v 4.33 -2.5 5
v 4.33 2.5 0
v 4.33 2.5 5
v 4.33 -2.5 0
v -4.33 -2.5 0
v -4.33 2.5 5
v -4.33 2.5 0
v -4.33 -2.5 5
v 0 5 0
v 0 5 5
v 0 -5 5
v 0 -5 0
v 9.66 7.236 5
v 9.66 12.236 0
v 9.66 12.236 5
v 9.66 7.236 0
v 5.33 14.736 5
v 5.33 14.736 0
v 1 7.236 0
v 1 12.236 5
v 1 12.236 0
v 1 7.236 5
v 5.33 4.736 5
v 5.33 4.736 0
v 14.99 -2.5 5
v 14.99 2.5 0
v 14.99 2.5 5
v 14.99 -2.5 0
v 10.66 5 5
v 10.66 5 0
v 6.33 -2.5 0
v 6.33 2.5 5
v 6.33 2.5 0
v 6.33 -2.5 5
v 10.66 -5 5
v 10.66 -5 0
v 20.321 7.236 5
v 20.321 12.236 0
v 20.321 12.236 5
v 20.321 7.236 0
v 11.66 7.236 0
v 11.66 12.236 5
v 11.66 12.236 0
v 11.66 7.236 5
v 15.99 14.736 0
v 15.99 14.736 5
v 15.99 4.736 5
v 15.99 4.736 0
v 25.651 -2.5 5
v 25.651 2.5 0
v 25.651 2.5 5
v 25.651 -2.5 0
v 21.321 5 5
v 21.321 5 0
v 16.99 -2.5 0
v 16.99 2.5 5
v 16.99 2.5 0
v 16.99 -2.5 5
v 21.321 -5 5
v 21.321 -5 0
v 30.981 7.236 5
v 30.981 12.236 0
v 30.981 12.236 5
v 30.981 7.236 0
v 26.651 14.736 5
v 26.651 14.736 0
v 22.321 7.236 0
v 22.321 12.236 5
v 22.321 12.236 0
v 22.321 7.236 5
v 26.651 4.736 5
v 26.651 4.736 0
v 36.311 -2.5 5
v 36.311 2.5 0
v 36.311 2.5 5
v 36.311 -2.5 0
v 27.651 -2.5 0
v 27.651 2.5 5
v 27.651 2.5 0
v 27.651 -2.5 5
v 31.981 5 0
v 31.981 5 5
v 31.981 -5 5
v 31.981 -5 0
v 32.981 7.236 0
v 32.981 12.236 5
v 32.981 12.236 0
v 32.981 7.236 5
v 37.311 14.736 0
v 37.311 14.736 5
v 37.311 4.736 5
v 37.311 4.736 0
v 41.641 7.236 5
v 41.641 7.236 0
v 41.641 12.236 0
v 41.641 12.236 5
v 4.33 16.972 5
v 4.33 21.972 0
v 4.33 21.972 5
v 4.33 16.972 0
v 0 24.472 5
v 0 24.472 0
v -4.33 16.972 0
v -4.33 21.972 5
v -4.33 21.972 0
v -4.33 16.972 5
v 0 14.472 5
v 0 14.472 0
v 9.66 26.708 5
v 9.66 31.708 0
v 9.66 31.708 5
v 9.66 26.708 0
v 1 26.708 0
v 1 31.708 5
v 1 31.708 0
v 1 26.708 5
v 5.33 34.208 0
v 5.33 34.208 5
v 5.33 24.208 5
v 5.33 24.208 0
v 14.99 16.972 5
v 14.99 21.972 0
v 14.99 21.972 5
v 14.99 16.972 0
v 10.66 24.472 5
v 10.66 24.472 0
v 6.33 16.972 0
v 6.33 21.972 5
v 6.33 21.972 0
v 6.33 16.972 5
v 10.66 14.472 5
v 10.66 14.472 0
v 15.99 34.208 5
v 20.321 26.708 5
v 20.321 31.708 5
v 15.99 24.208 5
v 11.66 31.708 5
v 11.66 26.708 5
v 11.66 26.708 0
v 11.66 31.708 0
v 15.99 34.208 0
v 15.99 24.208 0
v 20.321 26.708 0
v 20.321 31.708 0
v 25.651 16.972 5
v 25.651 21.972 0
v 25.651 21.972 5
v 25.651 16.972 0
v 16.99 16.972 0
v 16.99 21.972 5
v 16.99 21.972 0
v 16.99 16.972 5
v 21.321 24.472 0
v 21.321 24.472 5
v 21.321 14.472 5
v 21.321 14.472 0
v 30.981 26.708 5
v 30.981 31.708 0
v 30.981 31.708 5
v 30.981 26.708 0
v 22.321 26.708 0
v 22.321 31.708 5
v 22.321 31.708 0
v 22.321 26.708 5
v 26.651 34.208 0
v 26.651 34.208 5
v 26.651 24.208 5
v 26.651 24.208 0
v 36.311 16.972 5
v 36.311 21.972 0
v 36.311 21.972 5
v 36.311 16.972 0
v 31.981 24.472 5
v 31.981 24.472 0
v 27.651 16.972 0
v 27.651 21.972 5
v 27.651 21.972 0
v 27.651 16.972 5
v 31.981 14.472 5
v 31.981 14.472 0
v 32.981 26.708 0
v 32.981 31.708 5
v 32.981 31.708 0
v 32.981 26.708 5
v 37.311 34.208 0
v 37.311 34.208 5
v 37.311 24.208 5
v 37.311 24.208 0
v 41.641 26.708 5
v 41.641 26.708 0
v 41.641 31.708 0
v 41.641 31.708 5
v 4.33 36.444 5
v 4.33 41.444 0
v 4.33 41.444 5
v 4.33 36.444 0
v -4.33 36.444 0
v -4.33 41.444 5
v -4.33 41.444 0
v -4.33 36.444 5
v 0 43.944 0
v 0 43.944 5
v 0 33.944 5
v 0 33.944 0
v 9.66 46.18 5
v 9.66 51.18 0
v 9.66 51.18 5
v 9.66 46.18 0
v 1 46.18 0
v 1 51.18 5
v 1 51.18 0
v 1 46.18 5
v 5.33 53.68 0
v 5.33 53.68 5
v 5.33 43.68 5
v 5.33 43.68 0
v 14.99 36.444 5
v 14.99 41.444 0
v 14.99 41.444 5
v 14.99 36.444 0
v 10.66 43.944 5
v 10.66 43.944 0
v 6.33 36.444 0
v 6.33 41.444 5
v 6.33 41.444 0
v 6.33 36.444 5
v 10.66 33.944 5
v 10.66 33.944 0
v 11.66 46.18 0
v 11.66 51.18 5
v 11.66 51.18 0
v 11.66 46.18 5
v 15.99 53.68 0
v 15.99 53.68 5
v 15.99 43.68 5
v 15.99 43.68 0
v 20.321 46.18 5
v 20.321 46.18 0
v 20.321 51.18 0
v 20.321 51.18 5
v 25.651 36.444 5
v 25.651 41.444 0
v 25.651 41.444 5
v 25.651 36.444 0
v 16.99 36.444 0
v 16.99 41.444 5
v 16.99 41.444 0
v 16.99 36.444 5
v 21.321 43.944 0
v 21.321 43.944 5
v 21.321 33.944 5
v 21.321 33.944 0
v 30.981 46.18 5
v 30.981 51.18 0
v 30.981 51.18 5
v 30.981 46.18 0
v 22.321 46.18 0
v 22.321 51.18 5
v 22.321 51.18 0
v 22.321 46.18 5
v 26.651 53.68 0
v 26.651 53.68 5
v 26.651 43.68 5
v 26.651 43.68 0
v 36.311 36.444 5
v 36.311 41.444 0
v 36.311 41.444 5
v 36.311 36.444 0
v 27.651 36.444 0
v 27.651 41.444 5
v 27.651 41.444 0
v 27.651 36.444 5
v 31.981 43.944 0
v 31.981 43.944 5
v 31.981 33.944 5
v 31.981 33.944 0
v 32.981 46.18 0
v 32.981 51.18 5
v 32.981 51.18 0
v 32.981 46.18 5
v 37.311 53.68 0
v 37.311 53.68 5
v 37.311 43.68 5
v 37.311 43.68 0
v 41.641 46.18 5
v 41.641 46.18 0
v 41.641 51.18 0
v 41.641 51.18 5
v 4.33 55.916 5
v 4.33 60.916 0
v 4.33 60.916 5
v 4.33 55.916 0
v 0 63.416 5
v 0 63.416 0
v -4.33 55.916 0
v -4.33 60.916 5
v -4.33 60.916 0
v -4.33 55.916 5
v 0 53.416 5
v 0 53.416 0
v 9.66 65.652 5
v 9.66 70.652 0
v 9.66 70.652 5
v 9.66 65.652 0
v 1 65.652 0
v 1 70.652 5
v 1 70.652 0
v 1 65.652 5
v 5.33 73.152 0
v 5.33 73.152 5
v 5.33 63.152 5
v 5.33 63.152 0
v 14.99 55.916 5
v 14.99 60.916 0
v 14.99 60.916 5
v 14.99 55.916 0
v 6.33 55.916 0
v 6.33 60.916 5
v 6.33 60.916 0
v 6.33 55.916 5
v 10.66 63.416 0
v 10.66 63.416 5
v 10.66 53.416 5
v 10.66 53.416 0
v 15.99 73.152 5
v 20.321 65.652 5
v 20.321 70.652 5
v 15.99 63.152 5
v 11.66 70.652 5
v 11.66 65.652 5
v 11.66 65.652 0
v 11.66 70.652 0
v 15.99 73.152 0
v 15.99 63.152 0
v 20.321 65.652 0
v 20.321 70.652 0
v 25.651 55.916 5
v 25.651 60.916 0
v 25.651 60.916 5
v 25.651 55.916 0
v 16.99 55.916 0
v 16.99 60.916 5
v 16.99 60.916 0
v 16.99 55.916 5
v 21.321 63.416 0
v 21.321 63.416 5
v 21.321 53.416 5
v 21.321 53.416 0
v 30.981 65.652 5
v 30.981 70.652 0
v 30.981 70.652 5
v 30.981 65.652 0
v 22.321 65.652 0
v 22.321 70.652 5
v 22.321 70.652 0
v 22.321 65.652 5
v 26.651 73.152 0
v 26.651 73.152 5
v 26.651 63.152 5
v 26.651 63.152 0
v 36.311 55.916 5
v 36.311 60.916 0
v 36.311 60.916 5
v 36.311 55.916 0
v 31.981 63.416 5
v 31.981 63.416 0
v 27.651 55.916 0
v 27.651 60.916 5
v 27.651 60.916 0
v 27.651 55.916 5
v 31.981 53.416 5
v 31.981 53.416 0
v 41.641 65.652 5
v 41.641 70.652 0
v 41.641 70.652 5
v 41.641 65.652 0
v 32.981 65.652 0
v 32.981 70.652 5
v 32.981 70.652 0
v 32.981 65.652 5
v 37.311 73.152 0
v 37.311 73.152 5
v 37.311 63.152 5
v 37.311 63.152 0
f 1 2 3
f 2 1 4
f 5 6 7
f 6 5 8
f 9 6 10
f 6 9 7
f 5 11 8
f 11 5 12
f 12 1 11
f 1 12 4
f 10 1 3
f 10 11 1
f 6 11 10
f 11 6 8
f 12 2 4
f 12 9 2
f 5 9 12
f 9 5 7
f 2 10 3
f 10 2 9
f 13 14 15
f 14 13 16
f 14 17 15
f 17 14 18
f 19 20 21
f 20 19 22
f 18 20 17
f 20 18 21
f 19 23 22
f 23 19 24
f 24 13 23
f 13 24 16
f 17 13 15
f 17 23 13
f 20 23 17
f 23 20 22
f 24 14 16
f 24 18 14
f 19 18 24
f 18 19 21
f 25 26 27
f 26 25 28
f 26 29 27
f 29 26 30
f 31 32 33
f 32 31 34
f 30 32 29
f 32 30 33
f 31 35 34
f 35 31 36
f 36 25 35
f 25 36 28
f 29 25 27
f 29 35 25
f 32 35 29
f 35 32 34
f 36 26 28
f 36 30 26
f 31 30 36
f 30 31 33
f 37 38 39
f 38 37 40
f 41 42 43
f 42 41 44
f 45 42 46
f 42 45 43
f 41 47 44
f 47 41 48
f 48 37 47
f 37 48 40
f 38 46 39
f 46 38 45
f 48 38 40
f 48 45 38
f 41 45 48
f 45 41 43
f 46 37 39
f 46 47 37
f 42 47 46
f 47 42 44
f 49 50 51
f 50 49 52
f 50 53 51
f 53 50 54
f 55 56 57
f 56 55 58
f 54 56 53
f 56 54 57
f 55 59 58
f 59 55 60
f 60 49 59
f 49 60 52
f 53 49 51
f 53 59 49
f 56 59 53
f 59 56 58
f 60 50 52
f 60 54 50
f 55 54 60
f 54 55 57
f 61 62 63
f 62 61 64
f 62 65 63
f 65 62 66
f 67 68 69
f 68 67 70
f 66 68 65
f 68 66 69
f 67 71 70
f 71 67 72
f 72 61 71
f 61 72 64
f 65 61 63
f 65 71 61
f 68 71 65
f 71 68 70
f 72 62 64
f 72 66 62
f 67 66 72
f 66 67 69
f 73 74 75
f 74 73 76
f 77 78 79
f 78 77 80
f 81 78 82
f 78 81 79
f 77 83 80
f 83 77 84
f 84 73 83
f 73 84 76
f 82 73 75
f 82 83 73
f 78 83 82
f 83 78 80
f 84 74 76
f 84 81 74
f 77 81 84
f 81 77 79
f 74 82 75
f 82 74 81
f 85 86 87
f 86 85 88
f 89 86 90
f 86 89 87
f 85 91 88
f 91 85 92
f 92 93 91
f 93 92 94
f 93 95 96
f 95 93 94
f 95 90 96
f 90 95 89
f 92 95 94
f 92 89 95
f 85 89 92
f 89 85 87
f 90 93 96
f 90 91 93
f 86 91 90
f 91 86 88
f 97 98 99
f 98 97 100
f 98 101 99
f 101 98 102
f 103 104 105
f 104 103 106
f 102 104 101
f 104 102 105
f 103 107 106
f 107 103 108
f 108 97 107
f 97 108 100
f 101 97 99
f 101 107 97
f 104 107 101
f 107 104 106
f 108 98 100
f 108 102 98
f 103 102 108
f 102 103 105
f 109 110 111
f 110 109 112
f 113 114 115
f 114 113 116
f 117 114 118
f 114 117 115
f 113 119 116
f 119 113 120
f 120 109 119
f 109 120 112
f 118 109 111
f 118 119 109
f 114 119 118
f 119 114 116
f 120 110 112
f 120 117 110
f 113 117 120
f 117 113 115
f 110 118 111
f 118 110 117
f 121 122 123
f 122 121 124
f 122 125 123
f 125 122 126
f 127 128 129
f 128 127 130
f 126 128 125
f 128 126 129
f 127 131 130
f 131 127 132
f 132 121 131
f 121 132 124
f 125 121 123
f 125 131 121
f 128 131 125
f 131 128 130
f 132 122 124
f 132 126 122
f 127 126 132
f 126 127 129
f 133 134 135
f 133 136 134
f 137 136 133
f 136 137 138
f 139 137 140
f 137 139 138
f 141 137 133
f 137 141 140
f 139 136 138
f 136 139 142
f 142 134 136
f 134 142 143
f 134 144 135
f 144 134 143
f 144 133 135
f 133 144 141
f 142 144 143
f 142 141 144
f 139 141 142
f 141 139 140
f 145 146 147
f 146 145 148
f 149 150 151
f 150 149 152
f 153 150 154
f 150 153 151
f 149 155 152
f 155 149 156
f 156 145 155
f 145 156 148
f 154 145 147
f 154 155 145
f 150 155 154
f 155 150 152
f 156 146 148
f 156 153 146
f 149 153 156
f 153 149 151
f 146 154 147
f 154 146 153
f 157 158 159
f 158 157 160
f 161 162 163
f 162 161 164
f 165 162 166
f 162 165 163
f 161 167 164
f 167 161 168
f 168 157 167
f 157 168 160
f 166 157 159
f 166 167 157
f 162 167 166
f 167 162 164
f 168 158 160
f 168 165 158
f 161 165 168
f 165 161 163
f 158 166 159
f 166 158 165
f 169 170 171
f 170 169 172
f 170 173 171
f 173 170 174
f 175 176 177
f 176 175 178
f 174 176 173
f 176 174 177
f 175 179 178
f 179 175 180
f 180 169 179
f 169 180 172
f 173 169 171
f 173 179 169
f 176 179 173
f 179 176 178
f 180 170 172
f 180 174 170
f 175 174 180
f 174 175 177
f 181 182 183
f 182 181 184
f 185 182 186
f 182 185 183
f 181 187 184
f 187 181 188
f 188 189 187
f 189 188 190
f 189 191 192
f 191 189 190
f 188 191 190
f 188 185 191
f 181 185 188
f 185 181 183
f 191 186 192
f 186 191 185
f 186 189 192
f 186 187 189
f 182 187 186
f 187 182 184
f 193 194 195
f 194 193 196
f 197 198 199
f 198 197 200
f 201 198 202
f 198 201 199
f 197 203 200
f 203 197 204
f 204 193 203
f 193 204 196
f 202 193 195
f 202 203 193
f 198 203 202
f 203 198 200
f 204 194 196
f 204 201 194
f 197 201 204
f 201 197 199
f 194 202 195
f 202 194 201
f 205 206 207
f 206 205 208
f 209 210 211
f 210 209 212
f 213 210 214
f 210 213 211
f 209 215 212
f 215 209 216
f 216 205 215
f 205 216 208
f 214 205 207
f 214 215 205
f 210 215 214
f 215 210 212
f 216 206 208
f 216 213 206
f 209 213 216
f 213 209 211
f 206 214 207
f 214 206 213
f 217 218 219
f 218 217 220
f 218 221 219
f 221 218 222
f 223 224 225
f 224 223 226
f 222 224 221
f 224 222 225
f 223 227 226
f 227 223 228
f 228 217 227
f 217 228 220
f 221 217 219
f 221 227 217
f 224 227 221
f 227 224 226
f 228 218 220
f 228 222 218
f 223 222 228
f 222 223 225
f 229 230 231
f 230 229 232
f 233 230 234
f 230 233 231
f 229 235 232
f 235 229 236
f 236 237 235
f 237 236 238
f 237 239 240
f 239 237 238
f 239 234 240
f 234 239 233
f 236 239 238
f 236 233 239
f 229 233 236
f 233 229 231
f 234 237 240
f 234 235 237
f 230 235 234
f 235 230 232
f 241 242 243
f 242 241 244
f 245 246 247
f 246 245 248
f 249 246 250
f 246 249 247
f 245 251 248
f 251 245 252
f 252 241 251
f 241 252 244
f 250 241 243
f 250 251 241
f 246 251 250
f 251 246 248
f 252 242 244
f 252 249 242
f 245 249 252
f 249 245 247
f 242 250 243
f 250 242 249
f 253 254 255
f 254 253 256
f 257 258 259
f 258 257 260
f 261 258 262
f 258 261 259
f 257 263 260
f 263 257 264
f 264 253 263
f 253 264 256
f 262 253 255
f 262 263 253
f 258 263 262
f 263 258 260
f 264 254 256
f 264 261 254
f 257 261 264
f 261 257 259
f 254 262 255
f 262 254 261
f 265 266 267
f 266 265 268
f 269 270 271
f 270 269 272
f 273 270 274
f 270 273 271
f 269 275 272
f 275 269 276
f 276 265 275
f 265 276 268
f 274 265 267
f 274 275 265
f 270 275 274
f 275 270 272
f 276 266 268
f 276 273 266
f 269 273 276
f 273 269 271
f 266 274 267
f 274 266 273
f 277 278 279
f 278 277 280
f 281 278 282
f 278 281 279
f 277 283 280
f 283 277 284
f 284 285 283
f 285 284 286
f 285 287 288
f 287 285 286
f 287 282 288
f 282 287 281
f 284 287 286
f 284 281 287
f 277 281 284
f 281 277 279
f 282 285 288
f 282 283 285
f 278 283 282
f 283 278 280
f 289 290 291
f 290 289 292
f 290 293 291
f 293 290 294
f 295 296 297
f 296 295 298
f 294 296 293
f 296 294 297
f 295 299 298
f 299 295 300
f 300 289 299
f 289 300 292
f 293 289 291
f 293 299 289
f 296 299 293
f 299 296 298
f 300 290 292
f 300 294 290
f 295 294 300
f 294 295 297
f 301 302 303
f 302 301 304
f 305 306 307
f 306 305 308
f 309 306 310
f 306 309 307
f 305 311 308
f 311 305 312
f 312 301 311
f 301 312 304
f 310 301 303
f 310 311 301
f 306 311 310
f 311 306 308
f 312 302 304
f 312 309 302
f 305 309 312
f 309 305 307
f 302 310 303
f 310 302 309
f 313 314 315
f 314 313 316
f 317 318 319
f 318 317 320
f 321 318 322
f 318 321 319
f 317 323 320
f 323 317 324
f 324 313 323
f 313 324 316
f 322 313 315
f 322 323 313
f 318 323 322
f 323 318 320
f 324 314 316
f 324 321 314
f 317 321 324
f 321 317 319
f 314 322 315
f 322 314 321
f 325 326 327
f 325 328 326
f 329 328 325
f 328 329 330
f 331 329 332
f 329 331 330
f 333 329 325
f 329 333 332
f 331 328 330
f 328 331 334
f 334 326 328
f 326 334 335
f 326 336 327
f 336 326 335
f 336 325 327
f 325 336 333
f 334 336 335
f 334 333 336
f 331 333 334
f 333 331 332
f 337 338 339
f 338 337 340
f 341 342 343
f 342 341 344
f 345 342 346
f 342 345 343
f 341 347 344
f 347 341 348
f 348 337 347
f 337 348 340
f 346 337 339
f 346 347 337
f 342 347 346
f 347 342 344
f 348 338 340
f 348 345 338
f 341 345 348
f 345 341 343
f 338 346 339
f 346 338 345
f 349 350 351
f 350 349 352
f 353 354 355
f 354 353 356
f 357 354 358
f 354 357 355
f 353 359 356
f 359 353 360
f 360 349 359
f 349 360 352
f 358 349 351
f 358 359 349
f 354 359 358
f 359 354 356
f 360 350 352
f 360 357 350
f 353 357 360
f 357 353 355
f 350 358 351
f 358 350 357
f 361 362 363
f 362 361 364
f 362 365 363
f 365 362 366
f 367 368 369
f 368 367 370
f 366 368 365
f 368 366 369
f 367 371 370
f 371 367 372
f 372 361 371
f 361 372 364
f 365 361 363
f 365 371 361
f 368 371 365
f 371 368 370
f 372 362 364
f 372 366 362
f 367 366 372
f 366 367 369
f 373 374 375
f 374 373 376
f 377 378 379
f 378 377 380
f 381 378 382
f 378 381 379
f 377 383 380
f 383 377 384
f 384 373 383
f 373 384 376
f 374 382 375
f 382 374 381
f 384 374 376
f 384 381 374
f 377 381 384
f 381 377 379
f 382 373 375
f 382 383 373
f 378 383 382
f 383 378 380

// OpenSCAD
$fn=50;

module hexagon(extrusion_height, radius) {
    rotate([0, 0, 90])
    cylinder($fn=6, h=extrusion_height, r=radius);
}

module honeycomb(extrusion_height, radius, distance) {
    $hexagon_height = radius*2;
    $side = radius;
     
    // Using the pythagorean theorem:
    //
    //   (Width/2)^2 + (r/2)^2 = r^2
    //
    $hexagon_width = sqrt(3) * radius;
    
    // Using the pythagorean theorem:
    //
    //   VertDist^2 + (Dist/2)^2 = Dist^2
    //
    $vertical_distance = sqrt(1.25)*distance;

    $pattern_height = $hexagon_height + $vertical_distance * 2 + $side; 
    $pattern_width = $hexagon_width + distance;
    
    for(index_y = [0:1:3]){
        $y1 = index_y * $pattern_height;
        $y2 = $y1 + 0.75 * $hexagon_height + $vertical_distance;

        for(index_x = [0:1:3]) {
            $x1 = index_x * $pattern_width;
            translate([$x1, $y1, 0])
            hexagon(extrusion_height, radius);
            
            $x2 = $x1 + $hexagon_width/2 + distance/2;
            
            translate([$x2, $y2, 0])
            hexagon(extrusion_height, radius);
        }
    }
}

honeycomb(5, 5, distance=2);
